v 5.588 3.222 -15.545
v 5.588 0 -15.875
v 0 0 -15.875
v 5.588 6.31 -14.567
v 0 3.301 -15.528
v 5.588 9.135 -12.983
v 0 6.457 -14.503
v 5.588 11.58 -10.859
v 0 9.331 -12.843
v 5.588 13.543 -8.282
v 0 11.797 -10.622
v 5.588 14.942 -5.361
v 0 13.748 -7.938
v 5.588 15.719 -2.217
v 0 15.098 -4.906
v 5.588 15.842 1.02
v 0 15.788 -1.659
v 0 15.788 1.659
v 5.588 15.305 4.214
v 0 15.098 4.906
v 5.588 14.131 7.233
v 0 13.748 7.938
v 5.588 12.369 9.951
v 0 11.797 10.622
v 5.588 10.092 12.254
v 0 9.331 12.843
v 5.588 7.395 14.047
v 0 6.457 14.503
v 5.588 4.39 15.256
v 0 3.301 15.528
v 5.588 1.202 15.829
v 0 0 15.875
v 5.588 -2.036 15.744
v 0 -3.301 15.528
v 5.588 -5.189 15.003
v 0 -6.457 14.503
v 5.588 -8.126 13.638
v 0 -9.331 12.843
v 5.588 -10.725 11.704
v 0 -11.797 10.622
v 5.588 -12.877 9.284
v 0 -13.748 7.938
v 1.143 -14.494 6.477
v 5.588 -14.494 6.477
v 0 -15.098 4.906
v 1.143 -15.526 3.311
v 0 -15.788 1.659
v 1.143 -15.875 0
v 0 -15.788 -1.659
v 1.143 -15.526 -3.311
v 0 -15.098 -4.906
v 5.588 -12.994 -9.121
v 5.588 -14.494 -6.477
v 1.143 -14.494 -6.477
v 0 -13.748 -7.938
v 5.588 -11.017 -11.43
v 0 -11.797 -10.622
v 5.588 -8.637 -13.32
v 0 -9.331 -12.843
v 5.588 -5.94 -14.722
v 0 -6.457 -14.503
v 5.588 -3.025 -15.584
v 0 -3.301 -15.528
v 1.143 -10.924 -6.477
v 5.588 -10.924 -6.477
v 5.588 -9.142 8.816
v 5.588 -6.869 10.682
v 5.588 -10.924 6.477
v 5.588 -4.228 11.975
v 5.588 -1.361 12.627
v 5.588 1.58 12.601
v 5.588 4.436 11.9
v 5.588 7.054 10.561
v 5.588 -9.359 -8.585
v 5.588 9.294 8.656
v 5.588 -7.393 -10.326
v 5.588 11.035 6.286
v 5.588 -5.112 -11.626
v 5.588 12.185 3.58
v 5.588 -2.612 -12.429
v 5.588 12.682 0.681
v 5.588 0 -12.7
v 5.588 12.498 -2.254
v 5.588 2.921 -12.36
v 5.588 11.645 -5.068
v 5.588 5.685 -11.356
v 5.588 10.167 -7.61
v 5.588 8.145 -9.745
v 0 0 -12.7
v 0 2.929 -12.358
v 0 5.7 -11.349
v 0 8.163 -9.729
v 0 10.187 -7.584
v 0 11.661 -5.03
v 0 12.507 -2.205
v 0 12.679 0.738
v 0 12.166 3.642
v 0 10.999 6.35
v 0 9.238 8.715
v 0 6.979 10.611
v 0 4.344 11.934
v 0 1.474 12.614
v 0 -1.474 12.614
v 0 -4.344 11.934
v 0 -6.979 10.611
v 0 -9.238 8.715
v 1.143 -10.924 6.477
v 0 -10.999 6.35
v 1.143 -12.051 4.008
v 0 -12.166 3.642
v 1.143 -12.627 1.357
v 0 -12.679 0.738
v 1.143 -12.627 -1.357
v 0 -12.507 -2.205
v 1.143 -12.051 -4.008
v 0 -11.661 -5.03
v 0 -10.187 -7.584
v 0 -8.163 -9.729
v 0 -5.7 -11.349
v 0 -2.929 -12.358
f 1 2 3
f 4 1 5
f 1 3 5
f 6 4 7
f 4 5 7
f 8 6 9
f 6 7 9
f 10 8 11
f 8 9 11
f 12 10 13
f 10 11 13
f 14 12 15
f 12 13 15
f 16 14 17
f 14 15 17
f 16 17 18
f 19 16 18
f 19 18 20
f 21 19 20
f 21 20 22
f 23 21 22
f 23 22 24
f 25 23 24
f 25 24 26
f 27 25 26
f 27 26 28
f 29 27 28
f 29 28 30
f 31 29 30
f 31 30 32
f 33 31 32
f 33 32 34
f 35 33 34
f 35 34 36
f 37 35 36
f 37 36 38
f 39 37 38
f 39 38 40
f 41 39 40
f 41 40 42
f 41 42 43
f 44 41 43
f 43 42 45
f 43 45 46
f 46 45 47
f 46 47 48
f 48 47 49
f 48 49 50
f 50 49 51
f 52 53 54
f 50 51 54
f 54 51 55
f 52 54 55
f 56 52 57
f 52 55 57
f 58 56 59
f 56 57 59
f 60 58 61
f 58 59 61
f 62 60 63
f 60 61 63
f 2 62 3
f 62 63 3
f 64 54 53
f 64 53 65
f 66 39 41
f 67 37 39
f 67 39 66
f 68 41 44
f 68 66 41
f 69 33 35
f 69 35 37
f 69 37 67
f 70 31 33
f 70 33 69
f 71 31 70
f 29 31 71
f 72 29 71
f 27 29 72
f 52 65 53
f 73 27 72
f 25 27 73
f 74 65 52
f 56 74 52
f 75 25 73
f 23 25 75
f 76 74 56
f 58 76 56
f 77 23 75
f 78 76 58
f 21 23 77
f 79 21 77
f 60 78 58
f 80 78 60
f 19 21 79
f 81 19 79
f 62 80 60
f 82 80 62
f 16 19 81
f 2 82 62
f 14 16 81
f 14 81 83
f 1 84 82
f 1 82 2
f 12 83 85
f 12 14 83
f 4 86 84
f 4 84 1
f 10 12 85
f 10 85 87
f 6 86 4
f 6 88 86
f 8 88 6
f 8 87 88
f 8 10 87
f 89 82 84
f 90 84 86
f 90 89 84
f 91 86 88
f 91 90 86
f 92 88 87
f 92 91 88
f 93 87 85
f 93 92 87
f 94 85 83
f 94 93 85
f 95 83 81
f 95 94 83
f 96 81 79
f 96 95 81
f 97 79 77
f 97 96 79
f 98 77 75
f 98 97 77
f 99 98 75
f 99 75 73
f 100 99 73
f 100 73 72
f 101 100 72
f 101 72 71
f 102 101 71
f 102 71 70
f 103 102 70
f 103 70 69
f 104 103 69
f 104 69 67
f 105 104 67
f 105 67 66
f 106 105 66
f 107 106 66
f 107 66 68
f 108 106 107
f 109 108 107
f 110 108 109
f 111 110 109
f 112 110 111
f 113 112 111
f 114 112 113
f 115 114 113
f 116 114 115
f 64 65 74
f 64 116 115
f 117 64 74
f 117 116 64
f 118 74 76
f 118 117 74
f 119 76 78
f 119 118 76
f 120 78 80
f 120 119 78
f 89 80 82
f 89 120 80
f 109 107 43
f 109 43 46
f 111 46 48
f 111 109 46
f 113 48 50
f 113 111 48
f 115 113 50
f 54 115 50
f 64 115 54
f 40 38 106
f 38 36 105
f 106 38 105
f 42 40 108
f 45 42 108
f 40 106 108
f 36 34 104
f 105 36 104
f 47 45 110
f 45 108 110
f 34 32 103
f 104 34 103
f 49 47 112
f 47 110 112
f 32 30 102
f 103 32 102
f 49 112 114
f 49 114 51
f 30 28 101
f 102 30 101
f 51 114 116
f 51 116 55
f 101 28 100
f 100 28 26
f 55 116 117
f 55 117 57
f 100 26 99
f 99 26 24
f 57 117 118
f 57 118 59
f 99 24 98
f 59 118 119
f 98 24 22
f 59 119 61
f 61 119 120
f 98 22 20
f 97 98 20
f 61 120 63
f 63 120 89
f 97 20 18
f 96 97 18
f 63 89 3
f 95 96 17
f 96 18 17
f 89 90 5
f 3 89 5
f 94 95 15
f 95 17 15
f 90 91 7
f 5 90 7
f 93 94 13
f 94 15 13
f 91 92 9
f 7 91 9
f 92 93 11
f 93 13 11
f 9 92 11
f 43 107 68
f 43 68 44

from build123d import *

# Parameters (mm, degrees)
SKETCH1_R           = 15.875
SKETCH1_R_2         = 12.7
BOSS_EXTRUDE1_DEPTH = 5.588
CUT_EXTRUDE2_START  = -4.445
CUT_EXTRUDE2_DEPTH  = 4.445


with BuildPart() as part:
    # Sketch1 → Boss-Extrude1 (new body)
    with BuildSketch(Plane(origin=(0, 0, 0), x_dir=(0, 0, -1), z_dir=(1, 0, 0))):
        Circle(SKETCH1_R)
        Circle(SKETCH1_R_2, mode=Mode.SUBTRACT)
    extrude(amount=BOSS_EXTRUDE1_DEPTH)

    # Sketch3 → Cut-Extrude2 (cut)
    with BuildSketch(Plane(origin=(5.588, 0, 0), x_dir=(0, 0, -1), z_dir=(1, 0, 0)).offset(CUT_EXTRUDE2_START)):
        with BuildLine():
            Line((-6.477, -10.924214892), (-6.477, -14.4935881))
            ThreePointArc((-6.477, -14.4935881), (0, -15.875), (6.477, -14.4935881))
            Line((6.477, -14.4935881), (6.477, -10.924214892))
            Line((6.477, -10.924214892), (-6.477, -10.924214892))
        make_face()
    extrude(amount=CUT_EXTRUDE2_DEPTH, mode=Mode.SUBTRACT)


solid = part.part
